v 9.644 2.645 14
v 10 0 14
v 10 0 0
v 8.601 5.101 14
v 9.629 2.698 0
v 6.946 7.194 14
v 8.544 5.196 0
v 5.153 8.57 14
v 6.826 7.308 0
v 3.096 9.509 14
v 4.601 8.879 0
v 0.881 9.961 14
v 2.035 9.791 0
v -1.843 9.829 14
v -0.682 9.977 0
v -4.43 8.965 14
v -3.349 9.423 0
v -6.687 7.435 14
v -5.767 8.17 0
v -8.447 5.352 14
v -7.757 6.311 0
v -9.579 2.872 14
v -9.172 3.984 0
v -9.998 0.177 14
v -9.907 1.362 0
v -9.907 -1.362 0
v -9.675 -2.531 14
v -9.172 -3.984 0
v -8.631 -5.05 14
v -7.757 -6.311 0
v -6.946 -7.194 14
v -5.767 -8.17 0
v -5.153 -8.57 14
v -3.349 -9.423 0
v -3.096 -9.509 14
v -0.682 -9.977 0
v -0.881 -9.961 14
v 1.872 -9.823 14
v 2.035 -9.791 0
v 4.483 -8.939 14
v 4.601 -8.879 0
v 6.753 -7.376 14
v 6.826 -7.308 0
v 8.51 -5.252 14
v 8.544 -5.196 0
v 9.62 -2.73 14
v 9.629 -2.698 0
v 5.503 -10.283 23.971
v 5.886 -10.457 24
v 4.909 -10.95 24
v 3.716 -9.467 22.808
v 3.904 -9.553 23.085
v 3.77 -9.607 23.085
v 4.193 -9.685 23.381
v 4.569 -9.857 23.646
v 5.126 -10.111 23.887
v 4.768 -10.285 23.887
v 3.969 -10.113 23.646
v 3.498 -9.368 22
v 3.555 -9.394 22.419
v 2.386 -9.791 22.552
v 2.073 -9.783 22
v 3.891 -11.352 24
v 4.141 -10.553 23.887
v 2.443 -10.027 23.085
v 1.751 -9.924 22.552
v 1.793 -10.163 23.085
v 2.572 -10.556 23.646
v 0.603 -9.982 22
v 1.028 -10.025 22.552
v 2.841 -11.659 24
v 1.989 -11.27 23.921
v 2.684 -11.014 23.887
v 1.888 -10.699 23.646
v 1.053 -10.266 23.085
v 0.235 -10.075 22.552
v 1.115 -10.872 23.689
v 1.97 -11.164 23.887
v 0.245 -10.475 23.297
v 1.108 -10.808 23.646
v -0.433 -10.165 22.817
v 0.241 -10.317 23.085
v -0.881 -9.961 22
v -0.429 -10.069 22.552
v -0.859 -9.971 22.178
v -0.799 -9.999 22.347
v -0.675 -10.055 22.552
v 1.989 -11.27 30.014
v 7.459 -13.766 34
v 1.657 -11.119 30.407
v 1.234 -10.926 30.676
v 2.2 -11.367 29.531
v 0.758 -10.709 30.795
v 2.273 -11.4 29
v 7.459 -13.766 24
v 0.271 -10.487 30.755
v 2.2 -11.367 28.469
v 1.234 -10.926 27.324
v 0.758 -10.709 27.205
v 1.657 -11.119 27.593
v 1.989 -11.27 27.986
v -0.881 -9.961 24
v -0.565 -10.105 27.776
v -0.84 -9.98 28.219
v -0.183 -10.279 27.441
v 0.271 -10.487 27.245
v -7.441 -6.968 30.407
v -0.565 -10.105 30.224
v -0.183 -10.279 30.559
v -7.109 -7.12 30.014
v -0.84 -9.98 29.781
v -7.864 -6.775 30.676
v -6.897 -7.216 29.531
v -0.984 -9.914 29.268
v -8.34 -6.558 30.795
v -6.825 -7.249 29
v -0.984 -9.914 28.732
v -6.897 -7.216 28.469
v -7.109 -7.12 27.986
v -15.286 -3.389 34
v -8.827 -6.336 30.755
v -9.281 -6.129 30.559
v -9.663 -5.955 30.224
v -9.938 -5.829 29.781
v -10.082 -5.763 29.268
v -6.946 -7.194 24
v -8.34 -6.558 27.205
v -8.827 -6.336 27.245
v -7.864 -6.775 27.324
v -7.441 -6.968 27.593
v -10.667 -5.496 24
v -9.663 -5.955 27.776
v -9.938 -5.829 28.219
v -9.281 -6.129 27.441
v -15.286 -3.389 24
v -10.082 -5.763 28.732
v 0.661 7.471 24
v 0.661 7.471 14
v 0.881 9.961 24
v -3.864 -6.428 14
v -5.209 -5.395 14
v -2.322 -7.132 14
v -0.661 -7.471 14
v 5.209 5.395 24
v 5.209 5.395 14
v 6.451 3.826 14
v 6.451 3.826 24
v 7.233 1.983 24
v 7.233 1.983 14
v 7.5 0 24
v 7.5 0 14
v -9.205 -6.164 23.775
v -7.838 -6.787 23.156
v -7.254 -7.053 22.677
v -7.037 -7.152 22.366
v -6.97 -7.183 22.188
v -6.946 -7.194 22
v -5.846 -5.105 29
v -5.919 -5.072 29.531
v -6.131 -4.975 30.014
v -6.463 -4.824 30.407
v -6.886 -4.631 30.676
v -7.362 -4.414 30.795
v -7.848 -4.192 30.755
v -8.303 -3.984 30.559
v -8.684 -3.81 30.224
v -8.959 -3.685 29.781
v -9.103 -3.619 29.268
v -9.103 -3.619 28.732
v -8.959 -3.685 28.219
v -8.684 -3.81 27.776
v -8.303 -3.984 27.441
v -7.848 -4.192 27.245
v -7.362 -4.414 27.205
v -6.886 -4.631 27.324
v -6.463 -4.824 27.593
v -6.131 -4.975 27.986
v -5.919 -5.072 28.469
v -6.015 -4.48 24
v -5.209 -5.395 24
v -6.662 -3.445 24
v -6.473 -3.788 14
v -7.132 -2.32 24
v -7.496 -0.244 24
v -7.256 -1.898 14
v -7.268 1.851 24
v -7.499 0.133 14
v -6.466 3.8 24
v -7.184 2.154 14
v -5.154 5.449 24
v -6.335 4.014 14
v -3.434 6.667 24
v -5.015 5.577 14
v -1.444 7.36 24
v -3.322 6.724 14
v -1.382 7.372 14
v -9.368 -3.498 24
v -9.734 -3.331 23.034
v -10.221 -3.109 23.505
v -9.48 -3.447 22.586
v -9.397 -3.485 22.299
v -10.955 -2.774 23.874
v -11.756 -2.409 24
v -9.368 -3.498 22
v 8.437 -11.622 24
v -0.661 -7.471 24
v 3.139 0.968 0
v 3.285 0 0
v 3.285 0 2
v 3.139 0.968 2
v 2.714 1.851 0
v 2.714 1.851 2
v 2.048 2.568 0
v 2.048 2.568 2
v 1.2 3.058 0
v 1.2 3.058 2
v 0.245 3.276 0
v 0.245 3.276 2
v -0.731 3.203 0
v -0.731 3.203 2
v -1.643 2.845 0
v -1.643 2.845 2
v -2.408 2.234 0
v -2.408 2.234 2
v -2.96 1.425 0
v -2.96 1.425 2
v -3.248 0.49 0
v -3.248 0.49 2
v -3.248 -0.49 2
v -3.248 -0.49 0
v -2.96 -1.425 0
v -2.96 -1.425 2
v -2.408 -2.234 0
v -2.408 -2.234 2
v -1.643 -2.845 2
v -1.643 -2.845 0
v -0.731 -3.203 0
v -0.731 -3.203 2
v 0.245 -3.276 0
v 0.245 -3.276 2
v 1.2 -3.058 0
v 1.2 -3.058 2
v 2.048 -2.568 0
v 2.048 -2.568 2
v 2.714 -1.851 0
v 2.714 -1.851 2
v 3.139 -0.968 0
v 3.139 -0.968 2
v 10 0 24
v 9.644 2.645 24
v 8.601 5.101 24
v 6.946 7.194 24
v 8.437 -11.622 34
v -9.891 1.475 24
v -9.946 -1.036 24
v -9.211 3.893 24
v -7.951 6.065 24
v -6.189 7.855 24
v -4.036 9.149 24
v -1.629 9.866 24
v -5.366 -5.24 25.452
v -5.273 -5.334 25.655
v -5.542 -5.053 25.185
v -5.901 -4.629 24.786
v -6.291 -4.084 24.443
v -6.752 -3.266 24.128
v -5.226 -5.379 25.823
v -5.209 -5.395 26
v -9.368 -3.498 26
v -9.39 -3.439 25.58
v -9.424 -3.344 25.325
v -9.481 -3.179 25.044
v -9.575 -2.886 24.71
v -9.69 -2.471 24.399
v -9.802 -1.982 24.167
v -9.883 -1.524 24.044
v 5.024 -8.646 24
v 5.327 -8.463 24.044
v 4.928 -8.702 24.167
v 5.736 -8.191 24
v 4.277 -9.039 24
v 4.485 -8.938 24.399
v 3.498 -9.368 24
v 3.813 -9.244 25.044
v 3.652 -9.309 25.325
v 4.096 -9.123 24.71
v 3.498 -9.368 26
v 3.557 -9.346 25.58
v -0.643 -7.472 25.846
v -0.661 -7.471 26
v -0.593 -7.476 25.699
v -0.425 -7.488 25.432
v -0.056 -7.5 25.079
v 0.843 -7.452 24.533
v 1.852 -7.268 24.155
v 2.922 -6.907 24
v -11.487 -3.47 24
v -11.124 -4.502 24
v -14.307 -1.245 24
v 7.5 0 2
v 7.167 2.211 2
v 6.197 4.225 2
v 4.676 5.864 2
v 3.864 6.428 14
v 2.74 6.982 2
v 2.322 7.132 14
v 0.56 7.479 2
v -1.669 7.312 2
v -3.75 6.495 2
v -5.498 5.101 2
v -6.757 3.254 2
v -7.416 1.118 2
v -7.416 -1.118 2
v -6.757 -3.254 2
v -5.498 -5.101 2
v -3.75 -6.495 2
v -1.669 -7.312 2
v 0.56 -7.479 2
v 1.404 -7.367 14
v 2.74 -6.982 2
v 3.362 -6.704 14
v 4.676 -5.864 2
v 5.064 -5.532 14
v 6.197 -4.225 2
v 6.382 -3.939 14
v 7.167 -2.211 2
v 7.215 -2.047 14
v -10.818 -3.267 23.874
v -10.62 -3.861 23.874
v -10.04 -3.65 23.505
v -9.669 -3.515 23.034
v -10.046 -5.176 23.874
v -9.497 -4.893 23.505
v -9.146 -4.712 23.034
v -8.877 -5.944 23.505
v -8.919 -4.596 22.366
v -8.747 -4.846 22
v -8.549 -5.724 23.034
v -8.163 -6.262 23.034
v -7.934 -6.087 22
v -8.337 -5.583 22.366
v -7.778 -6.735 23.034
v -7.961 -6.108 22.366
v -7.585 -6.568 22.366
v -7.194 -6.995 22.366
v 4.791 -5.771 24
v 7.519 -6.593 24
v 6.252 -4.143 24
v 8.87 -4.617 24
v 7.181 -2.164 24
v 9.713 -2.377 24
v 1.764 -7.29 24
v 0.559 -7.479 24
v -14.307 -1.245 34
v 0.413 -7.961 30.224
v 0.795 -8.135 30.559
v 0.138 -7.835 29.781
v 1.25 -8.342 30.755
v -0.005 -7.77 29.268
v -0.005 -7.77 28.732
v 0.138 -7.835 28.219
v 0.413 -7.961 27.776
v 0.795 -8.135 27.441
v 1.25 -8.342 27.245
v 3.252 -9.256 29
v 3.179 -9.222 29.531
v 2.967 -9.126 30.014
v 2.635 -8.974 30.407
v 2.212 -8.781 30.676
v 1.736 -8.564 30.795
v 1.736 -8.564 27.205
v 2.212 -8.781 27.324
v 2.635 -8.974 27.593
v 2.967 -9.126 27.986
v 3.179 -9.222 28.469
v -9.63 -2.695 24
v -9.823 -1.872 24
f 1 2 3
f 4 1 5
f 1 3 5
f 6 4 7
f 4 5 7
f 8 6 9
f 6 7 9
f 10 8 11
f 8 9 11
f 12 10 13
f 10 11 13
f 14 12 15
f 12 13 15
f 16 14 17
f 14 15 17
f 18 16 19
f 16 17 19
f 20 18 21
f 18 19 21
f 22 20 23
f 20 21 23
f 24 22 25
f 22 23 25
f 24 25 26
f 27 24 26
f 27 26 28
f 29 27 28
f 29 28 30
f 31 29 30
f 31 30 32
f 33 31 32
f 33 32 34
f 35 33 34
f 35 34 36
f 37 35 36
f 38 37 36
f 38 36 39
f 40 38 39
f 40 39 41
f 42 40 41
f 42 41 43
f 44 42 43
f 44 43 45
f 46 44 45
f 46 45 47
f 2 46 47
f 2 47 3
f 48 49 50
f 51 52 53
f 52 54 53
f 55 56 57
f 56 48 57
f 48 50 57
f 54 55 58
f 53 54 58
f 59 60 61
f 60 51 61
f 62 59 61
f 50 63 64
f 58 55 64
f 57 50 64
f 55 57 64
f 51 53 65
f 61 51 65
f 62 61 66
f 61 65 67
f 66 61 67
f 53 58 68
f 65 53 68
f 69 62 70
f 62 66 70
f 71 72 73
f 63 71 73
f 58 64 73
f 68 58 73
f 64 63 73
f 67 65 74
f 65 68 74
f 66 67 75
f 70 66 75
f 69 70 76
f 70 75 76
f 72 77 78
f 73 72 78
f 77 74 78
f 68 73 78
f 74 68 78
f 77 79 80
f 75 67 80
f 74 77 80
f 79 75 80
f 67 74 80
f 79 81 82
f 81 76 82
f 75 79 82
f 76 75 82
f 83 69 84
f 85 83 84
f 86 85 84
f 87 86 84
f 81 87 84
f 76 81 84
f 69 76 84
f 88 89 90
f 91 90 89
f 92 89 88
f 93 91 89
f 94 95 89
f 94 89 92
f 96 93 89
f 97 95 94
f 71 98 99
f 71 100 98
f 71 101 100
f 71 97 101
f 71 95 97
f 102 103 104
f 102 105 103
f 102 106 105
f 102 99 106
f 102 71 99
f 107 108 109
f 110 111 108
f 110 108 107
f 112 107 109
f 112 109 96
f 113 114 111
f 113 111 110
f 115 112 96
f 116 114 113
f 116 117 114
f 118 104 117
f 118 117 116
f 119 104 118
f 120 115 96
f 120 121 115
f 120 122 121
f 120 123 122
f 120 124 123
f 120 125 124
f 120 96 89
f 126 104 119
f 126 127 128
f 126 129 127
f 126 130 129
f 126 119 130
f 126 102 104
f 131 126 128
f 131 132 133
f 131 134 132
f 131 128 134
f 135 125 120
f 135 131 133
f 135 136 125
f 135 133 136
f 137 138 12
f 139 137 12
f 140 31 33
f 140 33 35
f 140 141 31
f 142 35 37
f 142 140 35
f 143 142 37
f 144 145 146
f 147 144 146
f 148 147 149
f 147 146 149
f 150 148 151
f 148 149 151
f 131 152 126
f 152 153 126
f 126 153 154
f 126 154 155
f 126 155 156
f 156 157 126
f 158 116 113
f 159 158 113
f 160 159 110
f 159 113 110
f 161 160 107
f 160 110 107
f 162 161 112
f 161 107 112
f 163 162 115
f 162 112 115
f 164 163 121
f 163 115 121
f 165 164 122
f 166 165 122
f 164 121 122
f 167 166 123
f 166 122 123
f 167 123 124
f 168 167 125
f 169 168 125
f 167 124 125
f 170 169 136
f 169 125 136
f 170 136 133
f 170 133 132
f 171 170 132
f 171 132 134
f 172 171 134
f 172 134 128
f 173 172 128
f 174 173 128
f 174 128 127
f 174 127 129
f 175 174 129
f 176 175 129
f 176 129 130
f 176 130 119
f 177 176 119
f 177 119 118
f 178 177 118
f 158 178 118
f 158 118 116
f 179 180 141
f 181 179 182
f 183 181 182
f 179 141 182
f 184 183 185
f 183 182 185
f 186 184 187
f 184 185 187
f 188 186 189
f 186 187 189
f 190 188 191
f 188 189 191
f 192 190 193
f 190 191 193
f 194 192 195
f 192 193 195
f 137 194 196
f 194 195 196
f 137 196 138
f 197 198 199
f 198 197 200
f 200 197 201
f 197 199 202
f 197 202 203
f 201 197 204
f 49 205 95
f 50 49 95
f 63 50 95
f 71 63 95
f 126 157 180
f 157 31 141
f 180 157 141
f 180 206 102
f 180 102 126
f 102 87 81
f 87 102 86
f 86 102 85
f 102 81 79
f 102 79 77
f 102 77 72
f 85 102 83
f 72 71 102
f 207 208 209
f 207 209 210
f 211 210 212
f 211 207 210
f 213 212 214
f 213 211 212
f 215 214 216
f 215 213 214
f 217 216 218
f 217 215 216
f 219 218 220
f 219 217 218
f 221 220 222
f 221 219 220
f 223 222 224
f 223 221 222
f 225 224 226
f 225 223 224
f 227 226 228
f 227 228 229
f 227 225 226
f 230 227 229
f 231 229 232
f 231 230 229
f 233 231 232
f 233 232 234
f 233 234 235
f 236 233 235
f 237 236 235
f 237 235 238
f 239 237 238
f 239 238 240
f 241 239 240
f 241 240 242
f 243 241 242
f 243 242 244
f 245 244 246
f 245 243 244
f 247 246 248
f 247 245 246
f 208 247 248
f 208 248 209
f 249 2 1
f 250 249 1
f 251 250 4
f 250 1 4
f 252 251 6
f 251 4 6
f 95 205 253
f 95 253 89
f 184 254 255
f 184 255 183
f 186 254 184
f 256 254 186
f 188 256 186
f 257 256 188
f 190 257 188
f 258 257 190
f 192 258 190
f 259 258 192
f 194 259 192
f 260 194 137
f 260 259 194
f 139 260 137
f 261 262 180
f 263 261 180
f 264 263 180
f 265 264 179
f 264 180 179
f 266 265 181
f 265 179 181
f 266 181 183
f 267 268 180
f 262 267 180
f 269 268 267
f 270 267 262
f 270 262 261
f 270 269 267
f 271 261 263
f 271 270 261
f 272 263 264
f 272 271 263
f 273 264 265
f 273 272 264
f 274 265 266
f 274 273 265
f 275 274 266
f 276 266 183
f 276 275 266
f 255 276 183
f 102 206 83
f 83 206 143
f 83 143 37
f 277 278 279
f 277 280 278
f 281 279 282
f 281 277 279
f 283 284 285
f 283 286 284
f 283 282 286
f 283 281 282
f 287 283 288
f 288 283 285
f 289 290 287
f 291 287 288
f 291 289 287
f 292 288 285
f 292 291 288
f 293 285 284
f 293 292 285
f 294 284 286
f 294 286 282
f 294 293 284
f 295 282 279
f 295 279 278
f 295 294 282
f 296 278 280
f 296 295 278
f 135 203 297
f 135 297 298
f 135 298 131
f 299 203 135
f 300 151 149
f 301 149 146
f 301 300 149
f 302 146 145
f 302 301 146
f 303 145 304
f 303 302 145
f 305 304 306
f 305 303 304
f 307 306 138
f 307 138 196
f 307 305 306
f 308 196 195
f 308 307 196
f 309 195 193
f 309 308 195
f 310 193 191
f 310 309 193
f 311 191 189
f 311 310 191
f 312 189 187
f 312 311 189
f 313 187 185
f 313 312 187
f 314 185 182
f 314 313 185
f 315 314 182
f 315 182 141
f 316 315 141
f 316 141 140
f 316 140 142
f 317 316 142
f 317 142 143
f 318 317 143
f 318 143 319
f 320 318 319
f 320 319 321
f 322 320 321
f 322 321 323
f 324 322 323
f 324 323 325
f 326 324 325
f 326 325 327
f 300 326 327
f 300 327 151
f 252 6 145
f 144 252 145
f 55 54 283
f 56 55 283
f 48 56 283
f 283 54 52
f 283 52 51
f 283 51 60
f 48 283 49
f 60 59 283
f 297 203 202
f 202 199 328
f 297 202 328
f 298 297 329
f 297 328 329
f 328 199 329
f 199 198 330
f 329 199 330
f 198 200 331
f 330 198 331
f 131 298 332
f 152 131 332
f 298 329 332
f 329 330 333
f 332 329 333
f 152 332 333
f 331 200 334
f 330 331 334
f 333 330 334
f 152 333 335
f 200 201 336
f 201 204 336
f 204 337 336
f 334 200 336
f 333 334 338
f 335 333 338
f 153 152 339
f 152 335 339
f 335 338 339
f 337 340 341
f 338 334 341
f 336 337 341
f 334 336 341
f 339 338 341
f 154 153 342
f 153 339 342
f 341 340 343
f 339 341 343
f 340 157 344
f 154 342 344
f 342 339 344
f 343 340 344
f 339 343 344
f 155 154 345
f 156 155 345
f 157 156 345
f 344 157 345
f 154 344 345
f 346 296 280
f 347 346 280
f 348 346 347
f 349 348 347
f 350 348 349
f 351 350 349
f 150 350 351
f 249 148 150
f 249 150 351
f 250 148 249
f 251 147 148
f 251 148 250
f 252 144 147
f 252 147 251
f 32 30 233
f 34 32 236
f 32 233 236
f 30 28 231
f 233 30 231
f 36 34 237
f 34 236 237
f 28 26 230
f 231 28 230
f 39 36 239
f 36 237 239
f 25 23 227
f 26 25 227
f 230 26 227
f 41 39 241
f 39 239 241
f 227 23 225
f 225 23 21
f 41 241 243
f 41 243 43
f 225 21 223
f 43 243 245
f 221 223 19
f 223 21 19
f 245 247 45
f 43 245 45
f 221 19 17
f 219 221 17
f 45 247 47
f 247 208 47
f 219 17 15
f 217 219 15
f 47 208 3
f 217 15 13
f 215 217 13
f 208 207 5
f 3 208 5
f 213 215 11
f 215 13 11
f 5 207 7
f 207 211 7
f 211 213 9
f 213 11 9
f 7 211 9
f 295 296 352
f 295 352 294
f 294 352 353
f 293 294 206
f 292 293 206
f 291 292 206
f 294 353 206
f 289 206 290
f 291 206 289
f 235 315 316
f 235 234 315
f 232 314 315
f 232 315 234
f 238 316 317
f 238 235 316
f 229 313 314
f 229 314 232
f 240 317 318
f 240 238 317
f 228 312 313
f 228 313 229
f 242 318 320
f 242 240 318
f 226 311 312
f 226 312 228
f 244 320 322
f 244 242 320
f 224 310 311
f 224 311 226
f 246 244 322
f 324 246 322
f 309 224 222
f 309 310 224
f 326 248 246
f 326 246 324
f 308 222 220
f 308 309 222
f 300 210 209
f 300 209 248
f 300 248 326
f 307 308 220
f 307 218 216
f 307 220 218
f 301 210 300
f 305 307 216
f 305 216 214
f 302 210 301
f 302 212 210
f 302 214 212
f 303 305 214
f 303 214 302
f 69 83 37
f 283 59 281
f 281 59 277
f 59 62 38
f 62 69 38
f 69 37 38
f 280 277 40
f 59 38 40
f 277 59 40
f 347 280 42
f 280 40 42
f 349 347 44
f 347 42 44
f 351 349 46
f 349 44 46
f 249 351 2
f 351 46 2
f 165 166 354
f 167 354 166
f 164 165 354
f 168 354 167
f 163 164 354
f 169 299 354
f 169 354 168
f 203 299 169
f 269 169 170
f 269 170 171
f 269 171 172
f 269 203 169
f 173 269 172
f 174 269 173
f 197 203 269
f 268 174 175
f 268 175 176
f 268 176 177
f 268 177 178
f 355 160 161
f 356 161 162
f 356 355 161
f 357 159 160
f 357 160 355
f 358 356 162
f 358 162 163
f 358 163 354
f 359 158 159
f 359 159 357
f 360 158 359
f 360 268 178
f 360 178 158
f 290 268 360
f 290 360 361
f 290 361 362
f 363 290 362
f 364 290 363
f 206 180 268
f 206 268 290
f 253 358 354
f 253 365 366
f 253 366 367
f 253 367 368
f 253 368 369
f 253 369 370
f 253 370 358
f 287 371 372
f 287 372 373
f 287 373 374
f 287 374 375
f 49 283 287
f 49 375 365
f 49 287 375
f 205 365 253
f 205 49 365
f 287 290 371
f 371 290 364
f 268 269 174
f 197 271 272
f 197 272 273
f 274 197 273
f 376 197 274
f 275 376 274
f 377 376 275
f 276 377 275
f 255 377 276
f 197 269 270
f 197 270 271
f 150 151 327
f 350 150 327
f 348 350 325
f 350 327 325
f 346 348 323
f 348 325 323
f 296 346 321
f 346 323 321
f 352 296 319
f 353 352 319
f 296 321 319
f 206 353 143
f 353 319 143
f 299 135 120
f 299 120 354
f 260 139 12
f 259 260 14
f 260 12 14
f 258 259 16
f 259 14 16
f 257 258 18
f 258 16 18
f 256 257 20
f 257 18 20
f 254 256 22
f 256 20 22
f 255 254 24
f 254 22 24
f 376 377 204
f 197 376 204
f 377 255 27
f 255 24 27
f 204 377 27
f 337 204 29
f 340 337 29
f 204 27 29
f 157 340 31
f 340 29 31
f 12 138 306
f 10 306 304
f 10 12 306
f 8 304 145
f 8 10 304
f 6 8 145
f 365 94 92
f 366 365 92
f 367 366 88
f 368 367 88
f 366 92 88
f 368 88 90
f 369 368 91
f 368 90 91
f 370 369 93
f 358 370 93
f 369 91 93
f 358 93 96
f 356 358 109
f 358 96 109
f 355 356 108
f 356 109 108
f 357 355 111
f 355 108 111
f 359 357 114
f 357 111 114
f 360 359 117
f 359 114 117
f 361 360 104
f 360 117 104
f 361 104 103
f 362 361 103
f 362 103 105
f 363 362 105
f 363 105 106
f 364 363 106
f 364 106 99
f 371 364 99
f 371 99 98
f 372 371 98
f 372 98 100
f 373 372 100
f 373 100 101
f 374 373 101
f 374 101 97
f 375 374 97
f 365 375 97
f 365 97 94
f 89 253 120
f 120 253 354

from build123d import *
from build123d.topology import SkipClean

# Parameters (mm, degrees)
SKETCH1_R           = 7.5
SKETCH1_R_2         = 3.285
BOSS_EXTRUDE1_DEPTH = 2
SKETCH1_3_R         = 10
SKETCH1_3_R_2       = 7.5
BOSS_EXTRUDE2_DEPTH = 14
BOSS_EXTRUDE3_DEPTH = 10
BOSS_EXTRUDE4_DEPTH = 10
SKETCH4_R           = 1.8
CUT_EXTRUDE1_DEPTH  = 10
FILLET1_R           = 2
FILLET2_R           = 2


with BuildPart() as part:
    # Sketch1 → Boss-Extrude1 (new body)
    with BuildSketch(Plane.XY):
        Circle(SKETCH1_R)
        Circle(SKETCH1_R_2, mode=Mode.SUBTRACT)
    extrude(amount=BOSS_EXTRUDE1_DEPTH)

    # Sketch1<3> → Boss-Extrude2 (add)
    with BuildSketch(Plane.XY):
        Circle(SKETCH1_3_R)
        Circle(SKETCH1_3_R_2, mode=Mode.SUBTRACT)
    extrude(amount=BOSS_EXTRUDE2_DEPTH)

    # Sketch2 → Boss-Extrude3 (add)
    with SkipClean():  # the faces are left unmerged after this step: merging them gives an invalid solid
        with BuildSketch(Plane.XY.offset(14)):
            with BuildLine():
                ThreePointArc((0.880723614, 9.961140794), (-9.097879067, 4.150734451), (-6.945976325, -7.193984493))
                Line((-6.945976325, -7.193984493), (-5.209482244, -5.39548837))
                ThreePointArc((-5.209482244, -5.39548837), (-6.8234093, 3.113050838), (0.66054271, 7.470855595))
                Line((0.66054271, 7.470855595), (0.880723614, 9.961140794))
            make_face()
            with BuildLine():
                Line((-0.66054271, -7.470855595), (-0.880723614, -9.961140794))
                ThreePointArc((-0.880723614, -9.961140794), (6.752509306, -7.375880833), (10, 0))
                ThreePointArc((10, 0), (9.204883575, 3.907699883), (6.945976325, 7.193984493))
                Line((6.945976325, 7.193984493), (5.209482244, 5.39548837))
                ThreePointArc((5.209482244, 5.39548837), (6.903662681, 2.930774912), (7.5, 0))
                ThreePointArc((7.5, 0), (5.06438198, -5.531910625), (-0.66054271, -7.470855595))
            make_face()
        extrude(amount=BOSS_EXTRUDE3_DEPTH)

    # Sketch3 → Boss-Extrude4 (add)
    with SkipClean():  # the faces are left unmerged after this step: merging them gives an invalid solid
        with BuildSketch(Plane.XY.offset(24)):
            Polygon((8.437336357, -11.621590046), (7.458998865, -13.765980707), (-15.285698803, -3.38914458), (-14.307361311, -1.244753919), align=None)
        extrude(amount=BOSS_EXTRUDE4_DEPTH)

    # Sketch4 → Cut-Extrude1 (cut)
    with SkipClean():  # the faces are left unmerged after this step: merging them gives an invalid solid
        with BuildSketch(Plane(origin=(-3.913349969, -8.577562644, 0), x_dir=(0.9097879067131455, -0.4150734450654641, 0), z_dir=(-0.4150734450654641, -0.9097879067131455, 0))):
            with Locations((-5, 29)):
                Circle(SKETCH4_R)
            with Locations((5, 29)):
                Circle(SKETCH4_R)
        extrude(amount=-CUT_EXTRUDE1_DEPTH, mode=Mode.SUBTRACT)

    # Fillet1
    # the kernel refuses this fillet: 2 mm, written as the material it adds along each edge
    with BuildSketch(Plane(origin=(-5.209482244, -5.39548837, 24), x_dir=(0.415073445065464, 0.9097879067131456, 0), z_dir=(0.9097879067131456, -0.415073445065464, 0))) as fillet1_piece_1_section:
        with BuildLine():
            CenterArc((FILLET1_R, FILLET1_R), FILLET1_R, 180, 90)
            Line((0, FILLET1_R), (0, 0))
            Line((0, 0), (FILLET1_R, 0))
        make_face()
    fillet1_piece_1 = extrude(amount=14.571067812, mode=Mode.PRIVATE)
    fillet1_piece_1 = fillet1_piece_1 & Plane(origin=(0, 0, 24.466684855), x_dir=(-0.08807236135728662, -0.9961140793929938, 0), z_dir=(0, 0, -1)) * Cylinder(10, 38, mode=Mode.PRIVATE)
    fillet1_piece_1 = fillet1_piece_1 - Plane(origin=(0, 0, 24.466684855), x_dir=(0.6945976324993828, 0.7193984493493522, 0), z_dir=(0, 0, -1)) * Cylinder(7.5, 38, mode=Mode.PRIVATE)
    add(fillet1_piece_1)
    with BuildSketch(Plane(origin=(-13.917123993, -1.42279228, 24), x_dir=(0.415073445065464, 0.9097879067131456, 0), z_dir=(0.9097879067131456, -0.415073445065464, 0))) as fillet1_piece_2_section:
        with BuildLine():
            CenterArc((FILLET1_R, FILLET1_R), FILLET1_R, 180, 90)
            Line((0, FILLET1_R), (0, 0))
            Line((0, 0), (FILLET1_R, 0))
        make_face()
    fillet1_piece_2 = extrude(amount=14.571067812, mode=Mode.PRIVATE)
    fillet1_piece_2 = fillet1_piece_2 & Plane(origin=(0, 0, 24.466680249), x_dir=(0.08807236135728662, 0.9961140793929938, 0), z_dir=(0, 0, -1)) * Cylinder(10, 38, mode=Mode.PRIVATE)
    fillet1_piece_2 = fillet1_piece_2 - Plane(origin=(0, 0, 24.466680249), x_dir=(0.6945976324993828, 0.7193984493493522, 0), z_dir=(0, 0, -1)) * Cylinder(7.5, 38, mode=Mode.PRIVATE)
    add(fillet1_piece_2)

    # Fillet2
    # the kernel refuses this fillet: 2 mm, written as the material it adds along each edge
    with BuildSketch(Plane(origin=(0, 0, 24), x_dir=(0.7561376391606037, -0.6544126149797455, 0), z_dir=(0.6544126149797455, 0.7561376391606037, 0))) as fillet2_piece_1_section:
        with BuildLine():
            CenterArc((10 + FILLET2_R, FILLET2_R), FILLET2_R, 180, 90)
            Line((10 + FILLET2_R, 0), (10, 0))
            Line((10, 0), (10, FILLET2_R))
        make_face()
    fillet2_piece_1 = revolve(axis=Axis((0, 0, 24), (0, 0, -1)), revolution_arc=82.826410261, mode=Mode.PRIVATE)
    fillet2_piece_1 = split(fillet2_piece_1, bisect_by=Plane(origin=(2.607194883, -8.96169878, 23.537511389), z_dir=(-0.415073445065464, -0.9097879067131456, 0)), keep=Keep.TOP, mode=Mode.PRIVATE)
    fillet2_piece_1 = split(fillet2_piece_1, bisect_by=Plane(origin=(1.628857391, -11.106089441, 23.537511389), z_dir=(0.41507344506546406, 0.9097879067131456, 0)), keep=Keep.TOP, mode=Mode.PRIVATE)
    add(fillet2_piece_1)
    with BuildSketch(Plane(origin=(0, 0, 24), x_dir=(-0.9898439357335846, 0.1421583022248339, 0), z_dir=(0.1421583022248339, 0.9898439357335846, 0))) as fillet2_piece_2_section:
        with BuildLine():
            CenterArc((10 + FILLET2_R, -FILLET2_R), FILLET2_R, 90, 90)
            Line((10 + FILLET2_R, 0), (10, 0))
            Line((10, 0), (10, -FILLET2_R))
        make_face()
    fillet2_piece_2 = revolve(axis=Axis((0, 0, 24), (0, 0, 1)), revolution_arc=82.826410261, mode=Mode.PRIVATE)
    fillet2_piece_2 = split(fillet2_piece_2, bisect_by=Plane(origin=(-8.477218422, -3.904645831, 23.537511225), z_dir=(-0.415073445065464, -0.9097879067131456, 0)), keep=Keep.TOP, mode=Mode.PRIVATE)
    fillet2_piece_2 = split(fillet2_piece_2, bisect_by=Plane(origin=(-9.455555915, -6.049036492, 23.537511225), z_dir=(0.41507344506546406, 0.9097879067131456, 0)), keep=Keep.TOP, mode=Mode.PRIVATE)
    add(fillet2_piece_2)


solid = part.part
